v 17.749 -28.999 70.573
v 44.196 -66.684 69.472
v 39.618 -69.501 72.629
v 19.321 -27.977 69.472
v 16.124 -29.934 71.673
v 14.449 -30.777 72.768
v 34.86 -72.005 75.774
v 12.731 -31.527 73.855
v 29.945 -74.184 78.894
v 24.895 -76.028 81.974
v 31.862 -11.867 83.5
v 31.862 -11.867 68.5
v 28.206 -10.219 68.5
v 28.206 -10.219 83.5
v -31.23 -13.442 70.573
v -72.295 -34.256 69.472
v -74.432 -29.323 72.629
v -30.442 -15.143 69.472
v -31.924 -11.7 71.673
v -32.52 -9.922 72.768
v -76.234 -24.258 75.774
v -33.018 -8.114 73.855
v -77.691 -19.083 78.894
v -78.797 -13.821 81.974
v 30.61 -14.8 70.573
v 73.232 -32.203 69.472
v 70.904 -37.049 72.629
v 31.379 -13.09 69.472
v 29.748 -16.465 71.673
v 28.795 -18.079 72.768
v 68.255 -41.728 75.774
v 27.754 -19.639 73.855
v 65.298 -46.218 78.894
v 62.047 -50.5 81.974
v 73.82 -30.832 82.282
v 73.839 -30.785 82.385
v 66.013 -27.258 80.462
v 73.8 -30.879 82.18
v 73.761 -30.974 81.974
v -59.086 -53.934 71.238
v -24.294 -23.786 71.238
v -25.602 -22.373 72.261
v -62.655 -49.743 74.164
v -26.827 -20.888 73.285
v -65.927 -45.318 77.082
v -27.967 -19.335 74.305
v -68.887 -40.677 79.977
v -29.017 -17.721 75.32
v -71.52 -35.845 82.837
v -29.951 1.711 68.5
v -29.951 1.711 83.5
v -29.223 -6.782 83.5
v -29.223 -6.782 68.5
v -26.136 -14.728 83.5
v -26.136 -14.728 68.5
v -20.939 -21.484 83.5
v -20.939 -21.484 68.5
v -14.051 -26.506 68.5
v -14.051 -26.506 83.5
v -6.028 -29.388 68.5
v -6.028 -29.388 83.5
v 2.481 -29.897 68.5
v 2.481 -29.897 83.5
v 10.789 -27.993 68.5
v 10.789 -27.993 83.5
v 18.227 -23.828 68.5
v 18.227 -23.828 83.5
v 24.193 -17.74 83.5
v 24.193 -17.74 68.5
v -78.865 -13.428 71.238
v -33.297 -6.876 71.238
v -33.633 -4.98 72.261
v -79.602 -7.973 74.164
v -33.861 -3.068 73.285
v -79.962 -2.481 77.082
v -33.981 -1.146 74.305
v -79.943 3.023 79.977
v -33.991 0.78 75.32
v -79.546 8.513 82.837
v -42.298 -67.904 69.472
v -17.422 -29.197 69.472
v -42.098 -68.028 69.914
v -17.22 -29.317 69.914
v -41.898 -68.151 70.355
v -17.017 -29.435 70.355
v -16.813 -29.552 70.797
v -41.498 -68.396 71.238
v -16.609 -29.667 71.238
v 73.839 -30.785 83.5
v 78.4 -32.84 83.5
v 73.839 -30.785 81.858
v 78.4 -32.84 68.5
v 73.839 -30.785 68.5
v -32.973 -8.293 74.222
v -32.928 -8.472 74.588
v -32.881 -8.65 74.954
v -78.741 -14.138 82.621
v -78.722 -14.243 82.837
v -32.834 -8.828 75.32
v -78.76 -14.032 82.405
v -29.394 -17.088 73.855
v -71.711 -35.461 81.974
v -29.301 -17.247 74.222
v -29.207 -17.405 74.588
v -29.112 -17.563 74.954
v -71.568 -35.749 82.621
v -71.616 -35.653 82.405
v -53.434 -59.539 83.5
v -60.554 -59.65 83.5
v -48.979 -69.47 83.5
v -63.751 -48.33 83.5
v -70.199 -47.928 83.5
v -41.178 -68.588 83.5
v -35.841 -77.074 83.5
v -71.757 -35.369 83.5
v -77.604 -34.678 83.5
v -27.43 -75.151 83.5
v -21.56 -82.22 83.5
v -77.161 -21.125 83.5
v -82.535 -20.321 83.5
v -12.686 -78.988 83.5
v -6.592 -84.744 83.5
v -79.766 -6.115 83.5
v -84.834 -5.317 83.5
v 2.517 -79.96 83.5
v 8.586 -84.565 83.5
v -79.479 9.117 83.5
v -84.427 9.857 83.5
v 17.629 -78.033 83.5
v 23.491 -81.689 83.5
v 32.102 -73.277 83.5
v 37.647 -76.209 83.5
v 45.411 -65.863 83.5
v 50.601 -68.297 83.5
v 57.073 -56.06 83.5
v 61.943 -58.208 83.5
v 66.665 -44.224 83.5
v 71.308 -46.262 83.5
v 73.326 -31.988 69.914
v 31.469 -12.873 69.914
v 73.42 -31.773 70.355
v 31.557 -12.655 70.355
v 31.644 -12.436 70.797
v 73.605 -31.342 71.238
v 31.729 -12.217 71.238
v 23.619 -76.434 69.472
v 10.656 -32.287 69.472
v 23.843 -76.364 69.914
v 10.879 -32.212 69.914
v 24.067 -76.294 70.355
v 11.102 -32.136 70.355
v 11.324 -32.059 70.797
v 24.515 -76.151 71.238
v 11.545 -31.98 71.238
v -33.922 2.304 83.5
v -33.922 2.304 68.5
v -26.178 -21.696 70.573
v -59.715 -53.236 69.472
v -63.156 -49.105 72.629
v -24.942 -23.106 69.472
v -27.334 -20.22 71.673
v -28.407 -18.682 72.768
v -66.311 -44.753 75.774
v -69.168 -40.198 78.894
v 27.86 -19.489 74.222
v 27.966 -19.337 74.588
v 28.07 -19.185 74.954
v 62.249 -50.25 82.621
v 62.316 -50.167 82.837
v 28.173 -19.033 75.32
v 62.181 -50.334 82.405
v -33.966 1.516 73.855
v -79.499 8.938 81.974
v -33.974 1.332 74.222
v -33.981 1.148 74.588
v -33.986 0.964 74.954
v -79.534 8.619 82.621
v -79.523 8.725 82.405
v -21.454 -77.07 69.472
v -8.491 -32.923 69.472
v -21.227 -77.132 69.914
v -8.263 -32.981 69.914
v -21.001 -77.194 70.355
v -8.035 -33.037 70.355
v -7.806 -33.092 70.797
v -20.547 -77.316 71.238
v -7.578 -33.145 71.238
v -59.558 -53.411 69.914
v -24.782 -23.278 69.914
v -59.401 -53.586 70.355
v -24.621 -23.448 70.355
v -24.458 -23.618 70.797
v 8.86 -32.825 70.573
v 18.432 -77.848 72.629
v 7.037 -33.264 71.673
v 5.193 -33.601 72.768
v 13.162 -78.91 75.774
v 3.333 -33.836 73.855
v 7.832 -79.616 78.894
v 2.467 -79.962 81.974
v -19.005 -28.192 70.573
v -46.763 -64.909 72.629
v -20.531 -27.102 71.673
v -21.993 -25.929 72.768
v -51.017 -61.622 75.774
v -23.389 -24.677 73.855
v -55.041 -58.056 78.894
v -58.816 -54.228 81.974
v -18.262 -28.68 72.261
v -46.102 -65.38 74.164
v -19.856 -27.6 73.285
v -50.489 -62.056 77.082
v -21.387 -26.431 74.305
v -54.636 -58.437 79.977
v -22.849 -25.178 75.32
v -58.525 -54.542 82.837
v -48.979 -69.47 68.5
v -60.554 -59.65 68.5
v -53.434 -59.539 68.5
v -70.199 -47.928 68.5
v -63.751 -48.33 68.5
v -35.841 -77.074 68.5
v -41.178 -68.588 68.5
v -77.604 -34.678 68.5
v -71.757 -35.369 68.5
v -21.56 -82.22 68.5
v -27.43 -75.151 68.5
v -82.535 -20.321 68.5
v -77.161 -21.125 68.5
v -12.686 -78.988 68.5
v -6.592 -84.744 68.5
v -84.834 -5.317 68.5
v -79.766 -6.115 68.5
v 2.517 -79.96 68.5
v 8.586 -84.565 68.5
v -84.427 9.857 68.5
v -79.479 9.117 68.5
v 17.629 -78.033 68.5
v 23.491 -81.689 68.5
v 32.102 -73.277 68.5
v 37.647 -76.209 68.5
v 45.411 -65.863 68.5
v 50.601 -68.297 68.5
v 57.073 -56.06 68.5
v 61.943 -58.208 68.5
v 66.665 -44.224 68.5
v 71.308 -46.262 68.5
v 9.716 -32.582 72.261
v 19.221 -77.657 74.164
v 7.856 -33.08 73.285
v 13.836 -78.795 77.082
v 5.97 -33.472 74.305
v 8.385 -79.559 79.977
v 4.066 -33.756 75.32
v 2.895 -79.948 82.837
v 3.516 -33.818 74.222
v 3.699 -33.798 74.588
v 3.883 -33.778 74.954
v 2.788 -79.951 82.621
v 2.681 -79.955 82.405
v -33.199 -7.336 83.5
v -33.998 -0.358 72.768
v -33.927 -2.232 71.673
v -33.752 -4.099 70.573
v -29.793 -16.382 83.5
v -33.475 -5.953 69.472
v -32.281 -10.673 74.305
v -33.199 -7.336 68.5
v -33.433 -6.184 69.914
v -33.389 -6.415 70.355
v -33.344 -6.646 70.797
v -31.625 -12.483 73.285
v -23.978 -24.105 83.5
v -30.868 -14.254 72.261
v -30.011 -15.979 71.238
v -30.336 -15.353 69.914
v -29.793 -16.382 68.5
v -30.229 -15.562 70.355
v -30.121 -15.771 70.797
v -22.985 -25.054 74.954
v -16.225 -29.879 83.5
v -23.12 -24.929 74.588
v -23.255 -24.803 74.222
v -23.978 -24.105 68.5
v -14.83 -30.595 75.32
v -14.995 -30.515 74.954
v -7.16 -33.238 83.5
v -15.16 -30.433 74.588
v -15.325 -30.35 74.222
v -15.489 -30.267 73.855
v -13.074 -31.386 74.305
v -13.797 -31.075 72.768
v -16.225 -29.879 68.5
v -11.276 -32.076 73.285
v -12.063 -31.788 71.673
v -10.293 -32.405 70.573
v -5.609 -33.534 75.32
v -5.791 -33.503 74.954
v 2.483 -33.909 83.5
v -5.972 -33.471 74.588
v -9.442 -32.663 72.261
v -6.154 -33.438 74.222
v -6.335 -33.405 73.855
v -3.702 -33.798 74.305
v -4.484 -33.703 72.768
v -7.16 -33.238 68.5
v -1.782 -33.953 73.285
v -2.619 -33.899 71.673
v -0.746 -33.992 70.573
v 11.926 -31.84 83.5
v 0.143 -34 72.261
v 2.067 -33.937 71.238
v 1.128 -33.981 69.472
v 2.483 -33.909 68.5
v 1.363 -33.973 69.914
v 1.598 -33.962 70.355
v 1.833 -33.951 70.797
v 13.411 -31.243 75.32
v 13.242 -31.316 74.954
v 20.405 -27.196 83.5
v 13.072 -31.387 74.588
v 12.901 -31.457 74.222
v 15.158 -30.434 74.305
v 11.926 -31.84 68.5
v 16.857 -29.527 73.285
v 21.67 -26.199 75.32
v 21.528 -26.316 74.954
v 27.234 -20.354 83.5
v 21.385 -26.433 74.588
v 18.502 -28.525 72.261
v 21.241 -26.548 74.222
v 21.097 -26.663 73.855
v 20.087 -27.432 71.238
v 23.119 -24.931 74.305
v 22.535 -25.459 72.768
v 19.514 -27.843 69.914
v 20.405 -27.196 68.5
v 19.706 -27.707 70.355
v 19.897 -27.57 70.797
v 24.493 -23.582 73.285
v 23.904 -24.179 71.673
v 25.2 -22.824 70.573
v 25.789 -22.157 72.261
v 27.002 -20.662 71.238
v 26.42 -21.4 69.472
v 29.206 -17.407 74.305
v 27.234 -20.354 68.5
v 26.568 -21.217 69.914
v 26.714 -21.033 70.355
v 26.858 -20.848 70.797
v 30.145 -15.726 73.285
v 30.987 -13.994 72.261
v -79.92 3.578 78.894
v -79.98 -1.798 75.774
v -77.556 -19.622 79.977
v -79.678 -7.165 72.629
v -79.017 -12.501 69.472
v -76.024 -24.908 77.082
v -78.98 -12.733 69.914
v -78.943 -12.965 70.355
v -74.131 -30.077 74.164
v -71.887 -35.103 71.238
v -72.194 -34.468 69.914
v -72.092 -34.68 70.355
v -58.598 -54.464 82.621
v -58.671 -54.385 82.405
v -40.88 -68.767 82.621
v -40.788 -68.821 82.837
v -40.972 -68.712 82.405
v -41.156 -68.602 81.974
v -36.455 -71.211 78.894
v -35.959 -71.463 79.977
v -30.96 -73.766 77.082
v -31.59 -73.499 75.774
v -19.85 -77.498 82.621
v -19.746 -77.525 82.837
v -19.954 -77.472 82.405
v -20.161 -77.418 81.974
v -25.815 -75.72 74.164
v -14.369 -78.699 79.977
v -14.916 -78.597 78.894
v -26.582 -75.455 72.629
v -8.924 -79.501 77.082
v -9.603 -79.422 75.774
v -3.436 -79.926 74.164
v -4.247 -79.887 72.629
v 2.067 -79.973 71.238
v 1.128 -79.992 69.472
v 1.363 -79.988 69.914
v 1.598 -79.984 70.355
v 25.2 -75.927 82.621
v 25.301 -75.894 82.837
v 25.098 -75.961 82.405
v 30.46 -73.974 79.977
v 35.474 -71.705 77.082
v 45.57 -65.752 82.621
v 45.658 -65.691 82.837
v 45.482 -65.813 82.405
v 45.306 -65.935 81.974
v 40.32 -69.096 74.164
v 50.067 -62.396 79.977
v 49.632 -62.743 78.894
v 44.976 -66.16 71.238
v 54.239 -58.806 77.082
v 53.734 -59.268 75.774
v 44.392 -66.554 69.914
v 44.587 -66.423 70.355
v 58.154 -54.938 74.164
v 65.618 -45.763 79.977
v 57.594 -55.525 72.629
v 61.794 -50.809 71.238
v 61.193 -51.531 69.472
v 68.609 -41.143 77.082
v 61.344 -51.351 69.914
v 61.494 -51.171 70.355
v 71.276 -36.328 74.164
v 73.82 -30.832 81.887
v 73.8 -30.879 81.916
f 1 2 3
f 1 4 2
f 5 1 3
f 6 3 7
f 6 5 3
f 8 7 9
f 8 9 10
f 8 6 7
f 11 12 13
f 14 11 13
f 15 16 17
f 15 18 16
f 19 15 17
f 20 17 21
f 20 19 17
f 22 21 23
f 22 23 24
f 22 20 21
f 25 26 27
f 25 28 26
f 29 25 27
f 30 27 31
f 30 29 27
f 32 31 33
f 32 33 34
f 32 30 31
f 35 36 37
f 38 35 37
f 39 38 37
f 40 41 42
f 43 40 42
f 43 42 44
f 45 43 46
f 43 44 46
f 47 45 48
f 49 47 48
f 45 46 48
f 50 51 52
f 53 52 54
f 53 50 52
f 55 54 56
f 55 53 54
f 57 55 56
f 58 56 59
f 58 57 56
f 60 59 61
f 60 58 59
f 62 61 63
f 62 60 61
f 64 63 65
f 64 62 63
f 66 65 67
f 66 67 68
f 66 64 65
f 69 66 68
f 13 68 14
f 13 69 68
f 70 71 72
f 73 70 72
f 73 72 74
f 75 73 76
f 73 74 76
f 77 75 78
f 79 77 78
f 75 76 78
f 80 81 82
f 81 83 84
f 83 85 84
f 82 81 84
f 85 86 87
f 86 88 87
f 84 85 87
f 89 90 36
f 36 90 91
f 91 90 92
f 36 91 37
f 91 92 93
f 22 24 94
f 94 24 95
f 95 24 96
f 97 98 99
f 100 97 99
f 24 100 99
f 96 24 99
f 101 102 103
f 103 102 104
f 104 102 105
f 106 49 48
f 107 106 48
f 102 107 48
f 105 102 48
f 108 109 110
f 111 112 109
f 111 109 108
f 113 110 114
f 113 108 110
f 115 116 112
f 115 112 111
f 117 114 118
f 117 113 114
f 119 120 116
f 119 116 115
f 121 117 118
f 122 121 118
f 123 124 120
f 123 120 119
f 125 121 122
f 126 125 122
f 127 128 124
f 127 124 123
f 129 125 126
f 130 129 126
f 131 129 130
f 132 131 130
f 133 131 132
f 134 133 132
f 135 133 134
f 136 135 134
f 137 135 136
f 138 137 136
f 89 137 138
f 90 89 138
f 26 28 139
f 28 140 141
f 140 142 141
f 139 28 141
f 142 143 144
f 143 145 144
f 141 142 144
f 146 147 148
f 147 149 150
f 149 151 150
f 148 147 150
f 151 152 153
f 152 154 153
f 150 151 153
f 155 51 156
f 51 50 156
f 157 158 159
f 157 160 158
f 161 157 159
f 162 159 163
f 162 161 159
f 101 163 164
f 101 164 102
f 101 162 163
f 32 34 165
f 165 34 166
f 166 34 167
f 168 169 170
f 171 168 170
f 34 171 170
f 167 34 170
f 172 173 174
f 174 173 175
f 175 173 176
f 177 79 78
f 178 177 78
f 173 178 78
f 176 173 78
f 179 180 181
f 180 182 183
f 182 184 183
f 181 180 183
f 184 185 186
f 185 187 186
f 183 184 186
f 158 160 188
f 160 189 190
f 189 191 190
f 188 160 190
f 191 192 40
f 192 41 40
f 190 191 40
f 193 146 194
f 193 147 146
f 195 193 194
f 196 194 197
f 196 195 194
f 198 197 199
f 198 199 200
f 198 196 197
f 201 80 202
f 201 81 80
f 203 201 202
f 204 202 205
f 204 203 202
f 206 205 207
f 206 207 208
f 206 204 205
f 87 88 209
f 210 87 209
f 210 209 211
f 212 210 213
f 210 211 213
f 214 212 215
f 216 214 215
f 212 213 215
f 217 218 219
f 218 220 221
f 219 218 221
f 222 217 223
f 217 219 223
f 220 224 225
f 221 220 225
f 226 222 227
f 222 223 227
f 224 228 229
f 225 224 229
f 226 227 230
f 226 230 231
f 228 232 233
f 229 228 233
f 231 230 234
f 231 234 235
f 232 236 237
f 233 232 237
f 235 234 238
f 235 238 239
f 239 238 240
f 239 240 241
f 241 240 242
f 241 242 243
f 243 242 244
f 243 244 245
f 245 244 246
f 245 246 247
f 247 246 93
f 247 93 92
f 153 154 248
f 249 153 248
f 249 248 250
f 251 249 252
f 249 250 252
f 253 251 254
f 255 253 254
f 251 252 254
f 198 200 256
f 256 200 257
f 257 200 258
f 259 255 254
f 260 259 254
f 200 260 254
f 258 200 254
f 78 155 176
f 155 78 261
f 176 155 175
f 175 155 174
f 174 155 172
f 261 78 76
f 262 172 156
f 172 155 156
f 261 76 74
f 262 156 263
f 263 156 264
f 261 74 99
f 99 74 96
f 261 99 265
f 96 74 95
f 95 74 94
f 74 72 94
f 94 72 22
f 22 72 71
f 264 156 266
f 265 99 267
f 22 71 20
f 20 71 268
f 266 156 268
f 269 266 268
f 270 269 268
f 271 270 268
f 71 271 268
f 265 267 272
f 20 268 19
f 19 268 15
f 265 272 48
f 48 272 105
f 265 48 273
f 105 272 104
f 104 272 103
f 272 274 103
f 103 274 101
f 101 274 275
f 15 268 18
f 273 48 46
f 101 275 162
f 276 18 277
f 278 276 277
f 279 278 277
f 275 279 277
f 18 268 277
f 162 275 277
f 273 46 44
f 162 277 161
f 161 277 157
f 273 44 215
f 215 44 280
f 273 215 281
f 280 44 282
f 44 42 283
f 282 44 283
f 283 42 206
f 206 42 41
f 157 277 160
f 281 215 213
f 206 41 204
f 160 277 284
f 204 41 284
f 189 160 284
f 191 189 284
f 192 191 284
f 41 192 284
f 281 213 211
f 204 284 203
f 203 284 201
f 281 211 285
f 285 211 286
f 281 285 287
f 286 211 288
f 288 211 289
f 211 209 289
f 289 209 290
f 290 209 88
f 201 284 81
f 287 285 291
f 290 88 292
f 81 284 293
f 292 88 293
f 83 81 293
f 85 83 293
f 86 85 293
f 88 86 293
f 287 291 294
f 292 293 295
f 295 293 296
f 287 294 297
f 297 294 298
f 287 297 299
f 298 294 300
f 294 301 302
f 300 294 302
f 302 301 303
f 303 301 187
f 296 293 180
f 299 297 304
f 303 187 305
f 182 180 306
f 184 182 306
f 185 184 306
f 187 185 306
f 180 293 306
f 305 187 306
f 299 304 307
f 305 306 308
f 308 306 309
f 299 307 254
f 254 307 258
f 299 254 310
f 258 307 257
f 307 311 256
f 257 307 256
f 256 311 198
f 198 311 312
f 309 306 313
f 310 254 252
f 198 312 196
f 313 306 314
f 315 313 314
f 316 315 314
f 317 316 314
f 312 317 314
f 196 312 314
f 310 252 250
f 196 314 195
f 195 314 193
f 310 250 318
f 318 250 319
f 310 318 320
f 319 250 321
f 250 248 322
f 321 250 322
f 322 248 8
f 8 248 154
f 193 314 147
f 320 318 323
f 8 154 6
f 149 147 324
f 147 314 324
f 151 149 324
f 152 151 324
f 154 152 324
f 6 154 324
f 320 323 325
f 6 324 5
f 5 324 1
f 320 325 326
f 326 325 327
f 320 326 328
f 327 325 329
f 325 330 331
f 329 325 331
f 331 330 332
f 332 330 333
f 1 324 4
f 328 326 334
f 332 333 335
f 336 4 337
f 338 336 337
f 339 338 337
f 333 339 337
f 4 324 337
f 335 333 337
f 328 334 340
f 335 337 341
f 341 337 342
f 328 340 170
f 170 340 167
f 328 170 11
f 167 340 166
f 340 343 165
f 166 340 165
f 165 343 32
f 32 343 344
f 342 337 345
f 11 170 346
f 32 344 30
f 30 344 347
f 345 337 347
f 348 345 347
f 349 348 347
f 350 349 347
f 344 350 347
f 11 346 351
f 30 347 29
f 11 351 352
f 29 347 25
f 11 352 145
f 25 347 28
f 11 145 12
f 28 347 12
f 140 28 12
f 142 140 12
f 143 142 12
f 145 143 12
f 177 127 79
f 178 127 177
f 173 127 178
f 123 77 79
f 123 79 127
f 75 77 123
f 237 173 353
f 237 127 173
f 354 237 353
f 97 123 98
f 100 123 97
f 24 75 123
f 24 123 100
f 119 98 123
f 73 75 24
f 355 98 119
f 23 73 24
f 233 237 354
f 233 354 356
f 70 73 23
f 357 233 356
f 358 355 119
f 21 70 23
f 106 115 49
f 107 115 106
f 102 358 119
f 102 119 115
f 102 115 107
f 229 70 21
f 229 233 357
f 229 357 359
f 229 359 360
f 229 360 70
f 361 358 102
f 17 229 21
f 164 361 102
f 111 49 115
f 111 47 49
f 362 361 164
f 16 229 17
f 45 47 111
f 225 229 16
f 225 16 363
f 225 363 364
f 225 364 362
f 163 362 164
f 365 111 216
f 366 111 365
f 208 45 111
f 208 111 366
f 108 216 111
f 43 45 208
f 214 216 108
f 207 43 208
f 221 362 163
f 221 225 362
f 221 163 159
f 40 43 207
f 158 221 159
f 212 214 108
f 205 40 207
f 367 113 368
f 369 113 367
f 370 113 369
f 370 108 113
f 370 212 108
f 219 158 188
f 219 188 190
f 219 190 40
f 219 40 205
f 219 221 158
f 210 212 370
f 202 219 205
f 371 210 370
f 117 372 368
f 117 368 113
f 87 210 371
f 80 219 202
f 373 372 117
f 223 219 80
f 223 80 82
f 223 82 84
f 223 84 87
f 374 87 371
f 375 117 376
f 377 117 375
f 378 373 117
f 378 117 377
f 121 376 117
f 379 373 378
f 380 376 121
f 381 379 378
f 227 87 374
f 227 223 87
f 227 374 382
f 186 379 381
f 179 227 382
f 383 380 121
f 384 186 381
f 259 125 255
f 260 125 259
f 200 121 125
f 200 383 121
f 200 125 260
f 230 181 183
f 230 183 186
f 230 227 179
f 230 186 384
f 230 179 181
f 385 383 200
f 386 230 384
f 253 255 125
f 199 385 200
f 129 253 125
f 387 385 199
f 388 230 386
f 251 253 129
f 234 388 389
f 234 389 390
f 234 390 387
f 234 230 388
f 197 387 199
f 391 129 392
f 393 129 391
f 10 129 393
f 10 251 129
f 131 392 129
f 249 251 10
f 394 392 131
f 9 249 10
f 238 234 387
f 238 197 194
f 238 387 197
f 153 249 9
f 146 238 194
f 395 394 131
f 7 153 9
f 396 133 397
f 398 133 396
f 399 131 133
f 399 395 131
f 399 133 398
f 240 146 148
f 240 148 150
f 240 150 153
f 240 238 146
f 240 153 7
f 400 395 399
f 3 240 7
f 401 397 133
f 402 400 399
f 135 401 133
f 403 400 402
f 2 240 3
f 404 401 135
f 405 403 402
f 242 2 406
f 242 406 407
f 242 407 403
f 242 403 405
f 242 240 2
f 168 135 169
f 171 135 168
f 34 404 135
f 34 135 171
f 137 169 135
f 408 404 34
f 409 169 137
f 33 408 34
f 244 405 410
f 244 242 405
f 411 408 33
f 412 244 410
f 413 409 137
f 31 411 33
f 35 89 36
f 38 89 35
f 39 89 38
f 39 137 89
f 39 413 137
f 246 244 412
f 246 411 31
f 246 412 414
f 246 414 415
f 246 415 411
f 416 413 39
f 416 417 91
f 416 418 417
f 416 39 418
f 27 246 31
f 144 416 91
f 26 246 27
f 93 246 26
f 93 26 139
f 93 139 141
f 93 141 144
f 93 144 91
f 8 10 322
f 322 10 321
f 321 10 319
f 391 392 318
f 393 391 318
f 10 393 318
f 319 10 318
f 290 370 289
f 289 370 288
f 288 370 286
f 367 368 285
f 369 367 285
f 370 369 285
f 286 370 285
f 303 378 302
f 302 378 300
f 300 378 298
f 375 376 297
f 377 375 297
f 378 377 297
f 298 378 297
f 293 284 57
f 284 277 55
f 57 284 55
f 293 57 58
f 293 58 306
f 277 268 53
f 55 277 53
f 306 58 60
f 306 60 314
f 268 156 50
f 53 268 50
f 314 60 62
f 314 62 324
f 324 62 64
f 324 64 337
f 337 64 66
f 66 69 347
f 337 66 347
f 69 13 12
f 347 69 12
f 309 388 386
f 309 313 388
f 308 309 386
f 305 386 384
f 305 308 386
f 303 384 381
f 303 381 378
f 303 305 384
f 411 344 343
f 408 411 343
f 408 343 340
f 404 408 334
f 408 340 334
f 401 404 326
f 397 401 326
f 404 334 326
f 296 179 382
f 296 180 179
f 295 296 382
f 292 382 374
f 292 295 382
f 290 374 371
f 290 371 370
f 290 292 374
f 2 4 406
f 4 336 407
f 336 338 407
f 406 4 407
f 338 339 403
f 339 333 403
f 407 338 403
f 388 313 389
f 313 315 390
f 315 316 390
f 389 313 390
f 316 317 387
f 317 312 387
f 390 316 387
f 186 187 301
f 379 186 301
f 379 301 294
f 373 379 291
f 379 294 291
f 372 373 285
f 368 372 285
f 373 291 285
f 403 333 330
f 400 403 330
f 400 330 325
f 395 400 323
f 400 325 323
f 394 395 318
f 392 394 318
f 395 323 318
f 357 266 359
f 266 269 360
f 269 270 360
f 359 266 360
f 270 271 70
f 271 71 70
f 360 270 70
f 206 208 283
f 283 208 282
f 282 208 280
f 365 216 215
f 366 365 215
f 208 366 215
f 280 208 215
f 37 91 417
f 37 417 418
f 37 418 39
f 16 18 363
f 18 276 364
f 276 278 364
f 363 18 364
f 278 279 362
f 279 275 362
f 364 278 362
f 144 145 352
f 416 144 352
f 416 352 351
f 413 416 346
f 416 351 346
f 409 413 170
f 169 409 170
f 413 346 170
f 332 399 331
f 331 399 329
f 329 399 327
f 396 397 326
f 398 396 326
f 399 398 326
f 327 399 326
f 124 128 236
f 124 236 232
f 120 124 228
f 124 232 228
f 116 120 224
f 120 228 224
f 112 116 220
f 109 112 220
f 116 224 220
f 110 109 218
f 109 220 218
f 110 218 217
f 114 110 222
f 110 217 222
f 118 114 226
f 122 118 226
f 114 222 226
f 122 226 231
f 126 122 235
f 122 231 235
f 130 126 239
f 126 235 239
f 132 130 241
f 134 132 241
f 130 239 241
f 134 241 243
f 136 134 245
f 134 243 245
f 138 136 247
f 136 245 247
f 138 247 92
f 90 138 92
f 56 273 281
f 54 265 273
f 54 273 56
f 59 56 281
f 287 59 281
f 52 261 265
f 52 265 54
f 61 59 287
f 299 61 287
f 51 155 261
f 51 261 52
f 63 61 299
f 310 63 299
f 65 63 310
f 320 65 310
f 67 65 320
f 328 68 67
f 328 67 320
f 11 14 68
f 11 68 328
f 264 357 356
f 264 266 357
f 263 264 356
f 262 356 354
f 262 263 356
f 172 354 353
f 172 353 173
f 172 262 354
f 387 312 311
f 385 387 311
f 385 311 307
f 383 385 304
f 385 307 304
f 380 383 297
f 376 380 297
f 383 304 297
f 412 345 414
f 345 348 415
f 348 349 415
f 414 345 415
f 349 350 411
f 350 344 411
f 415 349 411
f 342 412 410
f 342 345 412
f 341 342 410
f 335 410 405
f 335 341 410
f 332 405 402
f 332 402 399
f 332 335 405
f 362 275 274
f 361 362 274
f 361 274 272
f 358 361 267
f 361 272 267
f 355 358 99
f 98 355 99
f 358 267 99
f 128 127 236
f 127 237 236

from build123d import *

# Parameters (mm, degrees)
PAD036_DEPTH              = 200
TUBE014_R                 = 100
TUBE014_R_2               = 80
TUBE014_DEPTH             = 200
PAD026_DEPTH              = 100
PAD027_DEPTH              = 2
COMMON011_PLACEMENT_ANGLE = 28
ARRAY011_COUNT            = 22
ARRAY011_PLACEMENT_ANGLE  = 180
TUBE023_R                 = 85
TUBE023_R_2               = 80
TUBE023_DEPTH             = 15
TUBE024_R                 = 34
TUBE024_R_2               = 30
TUBE024_DEPTH             = 15


with BuildPart() as body037:
    # Sketch036 → Pad036 (new body)
    with BuildSketch(Plane.XY):
        Polygon((-29.110853, 1.584928), (-96.197479, 11.61747), (-96.197479, -126.516327), (86.349205, -133.978043), (86.349205, -36.423061), (25.978256, -9.215396), align=None)
    extrude(amount=PAD036_DEPTH)


with BuildPart() as tube014:
    # Tube014 → Tube014 (new body)
    with BuildSketch(Plane.XY):
        Circle(TUBE014_R)
        Circle(TUBE014_R_2, mode=Mode.SUBTRACT)
    extrude(amount=TUBE014_DEPTH)


with BuildPart() as body027:
    # Sketch026 → Pad026 (new body)
    with BuildSketch(Plane.XZ):
        Polygon((0, 0), (0, 2), (26, 0.9), (26, 0), align=None)
    extrude(amount=PAD026_DEPTH)


with BuildPart() as body027_1:
    # Body027 placement: moved
    add(body027.part.moved(Location((-5, 0, 5))))


with BuildPart() as cut003:
    # Sketch027 → Pad027 (new body)
    with BuildSketch(Plane.XY):
        Polygon((0, 0), (0, -52), (25.94305, -47.924315), (8.5, 0), align=None)
    extrude(amount=PAD027_DEPTH)


with BuildPart() as cut003_1:
    # Body028 placement: moved
    add(cut003.part.moved(Location((-5, -33, 5))))

    # Common011: intersect Body027
    add(body027_1.part, mode=Mode.INTERSECT)


with BuildPart() as cut003_2:
    # Common011 placement: moved
    add(cut003_1.part.rotate(Axis((0, 0, 0), (0, 1, 0)), COMMON011_PLACEMENT_ANGLE))

    # Array011: Cut003 ×22 about axis
    array011_axis = Axis((0, 0, 0), (0, 0, 1))


with BuildPart() as cut003_3:
    add(cut003_2.part)
    for i in range(1, ARRAY011_COUNT):
        add(cut003_2.part.rotate(array011_axis, i * 360 / ARRAY011_COUNT))


with BuildPart() as cut003_4:
    # Array011 placement: moved
    add(cut003_3.part.moved(Location((0, 0, 78))).rotate(Axis((0, 0, 78), (0, 1, 0)), ARRAY011_PLACEMENT_ANGLE))

    # Cut003: cut Tube014
    add(tube014.part, mode=Mode.SUBTRACT)


with BuildPart() as tube023:
    # Tube023 → Tube023 (new body)
    with BuildSketch(Plane.XY.offset(68.5)):
        Circle(TUBE023_R)
        Circle(TUBE023_R_2, mode=Mode.SUBTRACT)
    extrude(amount=TUBE023_DEPTH)


with BuildPart() as stator2h1:
    # Tube024 → Tube024 (new body)
    with BuildSketch(Plane.XY.offset(68.5)):
        Circle(TUBE024_R)
        Circle(TUBE024_R_2, mode=Mode.SUBTRACT)
    extrude(amount=TUBE024_DEPTH)

    # Fusion011: union Cut003, Tube023
    add(cut003_4.part)
    add(tube023.part)

    # Common019: intersect Body037
    add(body037.part, mode=Mode.INTERSECT)


solid = stator2h1.part
